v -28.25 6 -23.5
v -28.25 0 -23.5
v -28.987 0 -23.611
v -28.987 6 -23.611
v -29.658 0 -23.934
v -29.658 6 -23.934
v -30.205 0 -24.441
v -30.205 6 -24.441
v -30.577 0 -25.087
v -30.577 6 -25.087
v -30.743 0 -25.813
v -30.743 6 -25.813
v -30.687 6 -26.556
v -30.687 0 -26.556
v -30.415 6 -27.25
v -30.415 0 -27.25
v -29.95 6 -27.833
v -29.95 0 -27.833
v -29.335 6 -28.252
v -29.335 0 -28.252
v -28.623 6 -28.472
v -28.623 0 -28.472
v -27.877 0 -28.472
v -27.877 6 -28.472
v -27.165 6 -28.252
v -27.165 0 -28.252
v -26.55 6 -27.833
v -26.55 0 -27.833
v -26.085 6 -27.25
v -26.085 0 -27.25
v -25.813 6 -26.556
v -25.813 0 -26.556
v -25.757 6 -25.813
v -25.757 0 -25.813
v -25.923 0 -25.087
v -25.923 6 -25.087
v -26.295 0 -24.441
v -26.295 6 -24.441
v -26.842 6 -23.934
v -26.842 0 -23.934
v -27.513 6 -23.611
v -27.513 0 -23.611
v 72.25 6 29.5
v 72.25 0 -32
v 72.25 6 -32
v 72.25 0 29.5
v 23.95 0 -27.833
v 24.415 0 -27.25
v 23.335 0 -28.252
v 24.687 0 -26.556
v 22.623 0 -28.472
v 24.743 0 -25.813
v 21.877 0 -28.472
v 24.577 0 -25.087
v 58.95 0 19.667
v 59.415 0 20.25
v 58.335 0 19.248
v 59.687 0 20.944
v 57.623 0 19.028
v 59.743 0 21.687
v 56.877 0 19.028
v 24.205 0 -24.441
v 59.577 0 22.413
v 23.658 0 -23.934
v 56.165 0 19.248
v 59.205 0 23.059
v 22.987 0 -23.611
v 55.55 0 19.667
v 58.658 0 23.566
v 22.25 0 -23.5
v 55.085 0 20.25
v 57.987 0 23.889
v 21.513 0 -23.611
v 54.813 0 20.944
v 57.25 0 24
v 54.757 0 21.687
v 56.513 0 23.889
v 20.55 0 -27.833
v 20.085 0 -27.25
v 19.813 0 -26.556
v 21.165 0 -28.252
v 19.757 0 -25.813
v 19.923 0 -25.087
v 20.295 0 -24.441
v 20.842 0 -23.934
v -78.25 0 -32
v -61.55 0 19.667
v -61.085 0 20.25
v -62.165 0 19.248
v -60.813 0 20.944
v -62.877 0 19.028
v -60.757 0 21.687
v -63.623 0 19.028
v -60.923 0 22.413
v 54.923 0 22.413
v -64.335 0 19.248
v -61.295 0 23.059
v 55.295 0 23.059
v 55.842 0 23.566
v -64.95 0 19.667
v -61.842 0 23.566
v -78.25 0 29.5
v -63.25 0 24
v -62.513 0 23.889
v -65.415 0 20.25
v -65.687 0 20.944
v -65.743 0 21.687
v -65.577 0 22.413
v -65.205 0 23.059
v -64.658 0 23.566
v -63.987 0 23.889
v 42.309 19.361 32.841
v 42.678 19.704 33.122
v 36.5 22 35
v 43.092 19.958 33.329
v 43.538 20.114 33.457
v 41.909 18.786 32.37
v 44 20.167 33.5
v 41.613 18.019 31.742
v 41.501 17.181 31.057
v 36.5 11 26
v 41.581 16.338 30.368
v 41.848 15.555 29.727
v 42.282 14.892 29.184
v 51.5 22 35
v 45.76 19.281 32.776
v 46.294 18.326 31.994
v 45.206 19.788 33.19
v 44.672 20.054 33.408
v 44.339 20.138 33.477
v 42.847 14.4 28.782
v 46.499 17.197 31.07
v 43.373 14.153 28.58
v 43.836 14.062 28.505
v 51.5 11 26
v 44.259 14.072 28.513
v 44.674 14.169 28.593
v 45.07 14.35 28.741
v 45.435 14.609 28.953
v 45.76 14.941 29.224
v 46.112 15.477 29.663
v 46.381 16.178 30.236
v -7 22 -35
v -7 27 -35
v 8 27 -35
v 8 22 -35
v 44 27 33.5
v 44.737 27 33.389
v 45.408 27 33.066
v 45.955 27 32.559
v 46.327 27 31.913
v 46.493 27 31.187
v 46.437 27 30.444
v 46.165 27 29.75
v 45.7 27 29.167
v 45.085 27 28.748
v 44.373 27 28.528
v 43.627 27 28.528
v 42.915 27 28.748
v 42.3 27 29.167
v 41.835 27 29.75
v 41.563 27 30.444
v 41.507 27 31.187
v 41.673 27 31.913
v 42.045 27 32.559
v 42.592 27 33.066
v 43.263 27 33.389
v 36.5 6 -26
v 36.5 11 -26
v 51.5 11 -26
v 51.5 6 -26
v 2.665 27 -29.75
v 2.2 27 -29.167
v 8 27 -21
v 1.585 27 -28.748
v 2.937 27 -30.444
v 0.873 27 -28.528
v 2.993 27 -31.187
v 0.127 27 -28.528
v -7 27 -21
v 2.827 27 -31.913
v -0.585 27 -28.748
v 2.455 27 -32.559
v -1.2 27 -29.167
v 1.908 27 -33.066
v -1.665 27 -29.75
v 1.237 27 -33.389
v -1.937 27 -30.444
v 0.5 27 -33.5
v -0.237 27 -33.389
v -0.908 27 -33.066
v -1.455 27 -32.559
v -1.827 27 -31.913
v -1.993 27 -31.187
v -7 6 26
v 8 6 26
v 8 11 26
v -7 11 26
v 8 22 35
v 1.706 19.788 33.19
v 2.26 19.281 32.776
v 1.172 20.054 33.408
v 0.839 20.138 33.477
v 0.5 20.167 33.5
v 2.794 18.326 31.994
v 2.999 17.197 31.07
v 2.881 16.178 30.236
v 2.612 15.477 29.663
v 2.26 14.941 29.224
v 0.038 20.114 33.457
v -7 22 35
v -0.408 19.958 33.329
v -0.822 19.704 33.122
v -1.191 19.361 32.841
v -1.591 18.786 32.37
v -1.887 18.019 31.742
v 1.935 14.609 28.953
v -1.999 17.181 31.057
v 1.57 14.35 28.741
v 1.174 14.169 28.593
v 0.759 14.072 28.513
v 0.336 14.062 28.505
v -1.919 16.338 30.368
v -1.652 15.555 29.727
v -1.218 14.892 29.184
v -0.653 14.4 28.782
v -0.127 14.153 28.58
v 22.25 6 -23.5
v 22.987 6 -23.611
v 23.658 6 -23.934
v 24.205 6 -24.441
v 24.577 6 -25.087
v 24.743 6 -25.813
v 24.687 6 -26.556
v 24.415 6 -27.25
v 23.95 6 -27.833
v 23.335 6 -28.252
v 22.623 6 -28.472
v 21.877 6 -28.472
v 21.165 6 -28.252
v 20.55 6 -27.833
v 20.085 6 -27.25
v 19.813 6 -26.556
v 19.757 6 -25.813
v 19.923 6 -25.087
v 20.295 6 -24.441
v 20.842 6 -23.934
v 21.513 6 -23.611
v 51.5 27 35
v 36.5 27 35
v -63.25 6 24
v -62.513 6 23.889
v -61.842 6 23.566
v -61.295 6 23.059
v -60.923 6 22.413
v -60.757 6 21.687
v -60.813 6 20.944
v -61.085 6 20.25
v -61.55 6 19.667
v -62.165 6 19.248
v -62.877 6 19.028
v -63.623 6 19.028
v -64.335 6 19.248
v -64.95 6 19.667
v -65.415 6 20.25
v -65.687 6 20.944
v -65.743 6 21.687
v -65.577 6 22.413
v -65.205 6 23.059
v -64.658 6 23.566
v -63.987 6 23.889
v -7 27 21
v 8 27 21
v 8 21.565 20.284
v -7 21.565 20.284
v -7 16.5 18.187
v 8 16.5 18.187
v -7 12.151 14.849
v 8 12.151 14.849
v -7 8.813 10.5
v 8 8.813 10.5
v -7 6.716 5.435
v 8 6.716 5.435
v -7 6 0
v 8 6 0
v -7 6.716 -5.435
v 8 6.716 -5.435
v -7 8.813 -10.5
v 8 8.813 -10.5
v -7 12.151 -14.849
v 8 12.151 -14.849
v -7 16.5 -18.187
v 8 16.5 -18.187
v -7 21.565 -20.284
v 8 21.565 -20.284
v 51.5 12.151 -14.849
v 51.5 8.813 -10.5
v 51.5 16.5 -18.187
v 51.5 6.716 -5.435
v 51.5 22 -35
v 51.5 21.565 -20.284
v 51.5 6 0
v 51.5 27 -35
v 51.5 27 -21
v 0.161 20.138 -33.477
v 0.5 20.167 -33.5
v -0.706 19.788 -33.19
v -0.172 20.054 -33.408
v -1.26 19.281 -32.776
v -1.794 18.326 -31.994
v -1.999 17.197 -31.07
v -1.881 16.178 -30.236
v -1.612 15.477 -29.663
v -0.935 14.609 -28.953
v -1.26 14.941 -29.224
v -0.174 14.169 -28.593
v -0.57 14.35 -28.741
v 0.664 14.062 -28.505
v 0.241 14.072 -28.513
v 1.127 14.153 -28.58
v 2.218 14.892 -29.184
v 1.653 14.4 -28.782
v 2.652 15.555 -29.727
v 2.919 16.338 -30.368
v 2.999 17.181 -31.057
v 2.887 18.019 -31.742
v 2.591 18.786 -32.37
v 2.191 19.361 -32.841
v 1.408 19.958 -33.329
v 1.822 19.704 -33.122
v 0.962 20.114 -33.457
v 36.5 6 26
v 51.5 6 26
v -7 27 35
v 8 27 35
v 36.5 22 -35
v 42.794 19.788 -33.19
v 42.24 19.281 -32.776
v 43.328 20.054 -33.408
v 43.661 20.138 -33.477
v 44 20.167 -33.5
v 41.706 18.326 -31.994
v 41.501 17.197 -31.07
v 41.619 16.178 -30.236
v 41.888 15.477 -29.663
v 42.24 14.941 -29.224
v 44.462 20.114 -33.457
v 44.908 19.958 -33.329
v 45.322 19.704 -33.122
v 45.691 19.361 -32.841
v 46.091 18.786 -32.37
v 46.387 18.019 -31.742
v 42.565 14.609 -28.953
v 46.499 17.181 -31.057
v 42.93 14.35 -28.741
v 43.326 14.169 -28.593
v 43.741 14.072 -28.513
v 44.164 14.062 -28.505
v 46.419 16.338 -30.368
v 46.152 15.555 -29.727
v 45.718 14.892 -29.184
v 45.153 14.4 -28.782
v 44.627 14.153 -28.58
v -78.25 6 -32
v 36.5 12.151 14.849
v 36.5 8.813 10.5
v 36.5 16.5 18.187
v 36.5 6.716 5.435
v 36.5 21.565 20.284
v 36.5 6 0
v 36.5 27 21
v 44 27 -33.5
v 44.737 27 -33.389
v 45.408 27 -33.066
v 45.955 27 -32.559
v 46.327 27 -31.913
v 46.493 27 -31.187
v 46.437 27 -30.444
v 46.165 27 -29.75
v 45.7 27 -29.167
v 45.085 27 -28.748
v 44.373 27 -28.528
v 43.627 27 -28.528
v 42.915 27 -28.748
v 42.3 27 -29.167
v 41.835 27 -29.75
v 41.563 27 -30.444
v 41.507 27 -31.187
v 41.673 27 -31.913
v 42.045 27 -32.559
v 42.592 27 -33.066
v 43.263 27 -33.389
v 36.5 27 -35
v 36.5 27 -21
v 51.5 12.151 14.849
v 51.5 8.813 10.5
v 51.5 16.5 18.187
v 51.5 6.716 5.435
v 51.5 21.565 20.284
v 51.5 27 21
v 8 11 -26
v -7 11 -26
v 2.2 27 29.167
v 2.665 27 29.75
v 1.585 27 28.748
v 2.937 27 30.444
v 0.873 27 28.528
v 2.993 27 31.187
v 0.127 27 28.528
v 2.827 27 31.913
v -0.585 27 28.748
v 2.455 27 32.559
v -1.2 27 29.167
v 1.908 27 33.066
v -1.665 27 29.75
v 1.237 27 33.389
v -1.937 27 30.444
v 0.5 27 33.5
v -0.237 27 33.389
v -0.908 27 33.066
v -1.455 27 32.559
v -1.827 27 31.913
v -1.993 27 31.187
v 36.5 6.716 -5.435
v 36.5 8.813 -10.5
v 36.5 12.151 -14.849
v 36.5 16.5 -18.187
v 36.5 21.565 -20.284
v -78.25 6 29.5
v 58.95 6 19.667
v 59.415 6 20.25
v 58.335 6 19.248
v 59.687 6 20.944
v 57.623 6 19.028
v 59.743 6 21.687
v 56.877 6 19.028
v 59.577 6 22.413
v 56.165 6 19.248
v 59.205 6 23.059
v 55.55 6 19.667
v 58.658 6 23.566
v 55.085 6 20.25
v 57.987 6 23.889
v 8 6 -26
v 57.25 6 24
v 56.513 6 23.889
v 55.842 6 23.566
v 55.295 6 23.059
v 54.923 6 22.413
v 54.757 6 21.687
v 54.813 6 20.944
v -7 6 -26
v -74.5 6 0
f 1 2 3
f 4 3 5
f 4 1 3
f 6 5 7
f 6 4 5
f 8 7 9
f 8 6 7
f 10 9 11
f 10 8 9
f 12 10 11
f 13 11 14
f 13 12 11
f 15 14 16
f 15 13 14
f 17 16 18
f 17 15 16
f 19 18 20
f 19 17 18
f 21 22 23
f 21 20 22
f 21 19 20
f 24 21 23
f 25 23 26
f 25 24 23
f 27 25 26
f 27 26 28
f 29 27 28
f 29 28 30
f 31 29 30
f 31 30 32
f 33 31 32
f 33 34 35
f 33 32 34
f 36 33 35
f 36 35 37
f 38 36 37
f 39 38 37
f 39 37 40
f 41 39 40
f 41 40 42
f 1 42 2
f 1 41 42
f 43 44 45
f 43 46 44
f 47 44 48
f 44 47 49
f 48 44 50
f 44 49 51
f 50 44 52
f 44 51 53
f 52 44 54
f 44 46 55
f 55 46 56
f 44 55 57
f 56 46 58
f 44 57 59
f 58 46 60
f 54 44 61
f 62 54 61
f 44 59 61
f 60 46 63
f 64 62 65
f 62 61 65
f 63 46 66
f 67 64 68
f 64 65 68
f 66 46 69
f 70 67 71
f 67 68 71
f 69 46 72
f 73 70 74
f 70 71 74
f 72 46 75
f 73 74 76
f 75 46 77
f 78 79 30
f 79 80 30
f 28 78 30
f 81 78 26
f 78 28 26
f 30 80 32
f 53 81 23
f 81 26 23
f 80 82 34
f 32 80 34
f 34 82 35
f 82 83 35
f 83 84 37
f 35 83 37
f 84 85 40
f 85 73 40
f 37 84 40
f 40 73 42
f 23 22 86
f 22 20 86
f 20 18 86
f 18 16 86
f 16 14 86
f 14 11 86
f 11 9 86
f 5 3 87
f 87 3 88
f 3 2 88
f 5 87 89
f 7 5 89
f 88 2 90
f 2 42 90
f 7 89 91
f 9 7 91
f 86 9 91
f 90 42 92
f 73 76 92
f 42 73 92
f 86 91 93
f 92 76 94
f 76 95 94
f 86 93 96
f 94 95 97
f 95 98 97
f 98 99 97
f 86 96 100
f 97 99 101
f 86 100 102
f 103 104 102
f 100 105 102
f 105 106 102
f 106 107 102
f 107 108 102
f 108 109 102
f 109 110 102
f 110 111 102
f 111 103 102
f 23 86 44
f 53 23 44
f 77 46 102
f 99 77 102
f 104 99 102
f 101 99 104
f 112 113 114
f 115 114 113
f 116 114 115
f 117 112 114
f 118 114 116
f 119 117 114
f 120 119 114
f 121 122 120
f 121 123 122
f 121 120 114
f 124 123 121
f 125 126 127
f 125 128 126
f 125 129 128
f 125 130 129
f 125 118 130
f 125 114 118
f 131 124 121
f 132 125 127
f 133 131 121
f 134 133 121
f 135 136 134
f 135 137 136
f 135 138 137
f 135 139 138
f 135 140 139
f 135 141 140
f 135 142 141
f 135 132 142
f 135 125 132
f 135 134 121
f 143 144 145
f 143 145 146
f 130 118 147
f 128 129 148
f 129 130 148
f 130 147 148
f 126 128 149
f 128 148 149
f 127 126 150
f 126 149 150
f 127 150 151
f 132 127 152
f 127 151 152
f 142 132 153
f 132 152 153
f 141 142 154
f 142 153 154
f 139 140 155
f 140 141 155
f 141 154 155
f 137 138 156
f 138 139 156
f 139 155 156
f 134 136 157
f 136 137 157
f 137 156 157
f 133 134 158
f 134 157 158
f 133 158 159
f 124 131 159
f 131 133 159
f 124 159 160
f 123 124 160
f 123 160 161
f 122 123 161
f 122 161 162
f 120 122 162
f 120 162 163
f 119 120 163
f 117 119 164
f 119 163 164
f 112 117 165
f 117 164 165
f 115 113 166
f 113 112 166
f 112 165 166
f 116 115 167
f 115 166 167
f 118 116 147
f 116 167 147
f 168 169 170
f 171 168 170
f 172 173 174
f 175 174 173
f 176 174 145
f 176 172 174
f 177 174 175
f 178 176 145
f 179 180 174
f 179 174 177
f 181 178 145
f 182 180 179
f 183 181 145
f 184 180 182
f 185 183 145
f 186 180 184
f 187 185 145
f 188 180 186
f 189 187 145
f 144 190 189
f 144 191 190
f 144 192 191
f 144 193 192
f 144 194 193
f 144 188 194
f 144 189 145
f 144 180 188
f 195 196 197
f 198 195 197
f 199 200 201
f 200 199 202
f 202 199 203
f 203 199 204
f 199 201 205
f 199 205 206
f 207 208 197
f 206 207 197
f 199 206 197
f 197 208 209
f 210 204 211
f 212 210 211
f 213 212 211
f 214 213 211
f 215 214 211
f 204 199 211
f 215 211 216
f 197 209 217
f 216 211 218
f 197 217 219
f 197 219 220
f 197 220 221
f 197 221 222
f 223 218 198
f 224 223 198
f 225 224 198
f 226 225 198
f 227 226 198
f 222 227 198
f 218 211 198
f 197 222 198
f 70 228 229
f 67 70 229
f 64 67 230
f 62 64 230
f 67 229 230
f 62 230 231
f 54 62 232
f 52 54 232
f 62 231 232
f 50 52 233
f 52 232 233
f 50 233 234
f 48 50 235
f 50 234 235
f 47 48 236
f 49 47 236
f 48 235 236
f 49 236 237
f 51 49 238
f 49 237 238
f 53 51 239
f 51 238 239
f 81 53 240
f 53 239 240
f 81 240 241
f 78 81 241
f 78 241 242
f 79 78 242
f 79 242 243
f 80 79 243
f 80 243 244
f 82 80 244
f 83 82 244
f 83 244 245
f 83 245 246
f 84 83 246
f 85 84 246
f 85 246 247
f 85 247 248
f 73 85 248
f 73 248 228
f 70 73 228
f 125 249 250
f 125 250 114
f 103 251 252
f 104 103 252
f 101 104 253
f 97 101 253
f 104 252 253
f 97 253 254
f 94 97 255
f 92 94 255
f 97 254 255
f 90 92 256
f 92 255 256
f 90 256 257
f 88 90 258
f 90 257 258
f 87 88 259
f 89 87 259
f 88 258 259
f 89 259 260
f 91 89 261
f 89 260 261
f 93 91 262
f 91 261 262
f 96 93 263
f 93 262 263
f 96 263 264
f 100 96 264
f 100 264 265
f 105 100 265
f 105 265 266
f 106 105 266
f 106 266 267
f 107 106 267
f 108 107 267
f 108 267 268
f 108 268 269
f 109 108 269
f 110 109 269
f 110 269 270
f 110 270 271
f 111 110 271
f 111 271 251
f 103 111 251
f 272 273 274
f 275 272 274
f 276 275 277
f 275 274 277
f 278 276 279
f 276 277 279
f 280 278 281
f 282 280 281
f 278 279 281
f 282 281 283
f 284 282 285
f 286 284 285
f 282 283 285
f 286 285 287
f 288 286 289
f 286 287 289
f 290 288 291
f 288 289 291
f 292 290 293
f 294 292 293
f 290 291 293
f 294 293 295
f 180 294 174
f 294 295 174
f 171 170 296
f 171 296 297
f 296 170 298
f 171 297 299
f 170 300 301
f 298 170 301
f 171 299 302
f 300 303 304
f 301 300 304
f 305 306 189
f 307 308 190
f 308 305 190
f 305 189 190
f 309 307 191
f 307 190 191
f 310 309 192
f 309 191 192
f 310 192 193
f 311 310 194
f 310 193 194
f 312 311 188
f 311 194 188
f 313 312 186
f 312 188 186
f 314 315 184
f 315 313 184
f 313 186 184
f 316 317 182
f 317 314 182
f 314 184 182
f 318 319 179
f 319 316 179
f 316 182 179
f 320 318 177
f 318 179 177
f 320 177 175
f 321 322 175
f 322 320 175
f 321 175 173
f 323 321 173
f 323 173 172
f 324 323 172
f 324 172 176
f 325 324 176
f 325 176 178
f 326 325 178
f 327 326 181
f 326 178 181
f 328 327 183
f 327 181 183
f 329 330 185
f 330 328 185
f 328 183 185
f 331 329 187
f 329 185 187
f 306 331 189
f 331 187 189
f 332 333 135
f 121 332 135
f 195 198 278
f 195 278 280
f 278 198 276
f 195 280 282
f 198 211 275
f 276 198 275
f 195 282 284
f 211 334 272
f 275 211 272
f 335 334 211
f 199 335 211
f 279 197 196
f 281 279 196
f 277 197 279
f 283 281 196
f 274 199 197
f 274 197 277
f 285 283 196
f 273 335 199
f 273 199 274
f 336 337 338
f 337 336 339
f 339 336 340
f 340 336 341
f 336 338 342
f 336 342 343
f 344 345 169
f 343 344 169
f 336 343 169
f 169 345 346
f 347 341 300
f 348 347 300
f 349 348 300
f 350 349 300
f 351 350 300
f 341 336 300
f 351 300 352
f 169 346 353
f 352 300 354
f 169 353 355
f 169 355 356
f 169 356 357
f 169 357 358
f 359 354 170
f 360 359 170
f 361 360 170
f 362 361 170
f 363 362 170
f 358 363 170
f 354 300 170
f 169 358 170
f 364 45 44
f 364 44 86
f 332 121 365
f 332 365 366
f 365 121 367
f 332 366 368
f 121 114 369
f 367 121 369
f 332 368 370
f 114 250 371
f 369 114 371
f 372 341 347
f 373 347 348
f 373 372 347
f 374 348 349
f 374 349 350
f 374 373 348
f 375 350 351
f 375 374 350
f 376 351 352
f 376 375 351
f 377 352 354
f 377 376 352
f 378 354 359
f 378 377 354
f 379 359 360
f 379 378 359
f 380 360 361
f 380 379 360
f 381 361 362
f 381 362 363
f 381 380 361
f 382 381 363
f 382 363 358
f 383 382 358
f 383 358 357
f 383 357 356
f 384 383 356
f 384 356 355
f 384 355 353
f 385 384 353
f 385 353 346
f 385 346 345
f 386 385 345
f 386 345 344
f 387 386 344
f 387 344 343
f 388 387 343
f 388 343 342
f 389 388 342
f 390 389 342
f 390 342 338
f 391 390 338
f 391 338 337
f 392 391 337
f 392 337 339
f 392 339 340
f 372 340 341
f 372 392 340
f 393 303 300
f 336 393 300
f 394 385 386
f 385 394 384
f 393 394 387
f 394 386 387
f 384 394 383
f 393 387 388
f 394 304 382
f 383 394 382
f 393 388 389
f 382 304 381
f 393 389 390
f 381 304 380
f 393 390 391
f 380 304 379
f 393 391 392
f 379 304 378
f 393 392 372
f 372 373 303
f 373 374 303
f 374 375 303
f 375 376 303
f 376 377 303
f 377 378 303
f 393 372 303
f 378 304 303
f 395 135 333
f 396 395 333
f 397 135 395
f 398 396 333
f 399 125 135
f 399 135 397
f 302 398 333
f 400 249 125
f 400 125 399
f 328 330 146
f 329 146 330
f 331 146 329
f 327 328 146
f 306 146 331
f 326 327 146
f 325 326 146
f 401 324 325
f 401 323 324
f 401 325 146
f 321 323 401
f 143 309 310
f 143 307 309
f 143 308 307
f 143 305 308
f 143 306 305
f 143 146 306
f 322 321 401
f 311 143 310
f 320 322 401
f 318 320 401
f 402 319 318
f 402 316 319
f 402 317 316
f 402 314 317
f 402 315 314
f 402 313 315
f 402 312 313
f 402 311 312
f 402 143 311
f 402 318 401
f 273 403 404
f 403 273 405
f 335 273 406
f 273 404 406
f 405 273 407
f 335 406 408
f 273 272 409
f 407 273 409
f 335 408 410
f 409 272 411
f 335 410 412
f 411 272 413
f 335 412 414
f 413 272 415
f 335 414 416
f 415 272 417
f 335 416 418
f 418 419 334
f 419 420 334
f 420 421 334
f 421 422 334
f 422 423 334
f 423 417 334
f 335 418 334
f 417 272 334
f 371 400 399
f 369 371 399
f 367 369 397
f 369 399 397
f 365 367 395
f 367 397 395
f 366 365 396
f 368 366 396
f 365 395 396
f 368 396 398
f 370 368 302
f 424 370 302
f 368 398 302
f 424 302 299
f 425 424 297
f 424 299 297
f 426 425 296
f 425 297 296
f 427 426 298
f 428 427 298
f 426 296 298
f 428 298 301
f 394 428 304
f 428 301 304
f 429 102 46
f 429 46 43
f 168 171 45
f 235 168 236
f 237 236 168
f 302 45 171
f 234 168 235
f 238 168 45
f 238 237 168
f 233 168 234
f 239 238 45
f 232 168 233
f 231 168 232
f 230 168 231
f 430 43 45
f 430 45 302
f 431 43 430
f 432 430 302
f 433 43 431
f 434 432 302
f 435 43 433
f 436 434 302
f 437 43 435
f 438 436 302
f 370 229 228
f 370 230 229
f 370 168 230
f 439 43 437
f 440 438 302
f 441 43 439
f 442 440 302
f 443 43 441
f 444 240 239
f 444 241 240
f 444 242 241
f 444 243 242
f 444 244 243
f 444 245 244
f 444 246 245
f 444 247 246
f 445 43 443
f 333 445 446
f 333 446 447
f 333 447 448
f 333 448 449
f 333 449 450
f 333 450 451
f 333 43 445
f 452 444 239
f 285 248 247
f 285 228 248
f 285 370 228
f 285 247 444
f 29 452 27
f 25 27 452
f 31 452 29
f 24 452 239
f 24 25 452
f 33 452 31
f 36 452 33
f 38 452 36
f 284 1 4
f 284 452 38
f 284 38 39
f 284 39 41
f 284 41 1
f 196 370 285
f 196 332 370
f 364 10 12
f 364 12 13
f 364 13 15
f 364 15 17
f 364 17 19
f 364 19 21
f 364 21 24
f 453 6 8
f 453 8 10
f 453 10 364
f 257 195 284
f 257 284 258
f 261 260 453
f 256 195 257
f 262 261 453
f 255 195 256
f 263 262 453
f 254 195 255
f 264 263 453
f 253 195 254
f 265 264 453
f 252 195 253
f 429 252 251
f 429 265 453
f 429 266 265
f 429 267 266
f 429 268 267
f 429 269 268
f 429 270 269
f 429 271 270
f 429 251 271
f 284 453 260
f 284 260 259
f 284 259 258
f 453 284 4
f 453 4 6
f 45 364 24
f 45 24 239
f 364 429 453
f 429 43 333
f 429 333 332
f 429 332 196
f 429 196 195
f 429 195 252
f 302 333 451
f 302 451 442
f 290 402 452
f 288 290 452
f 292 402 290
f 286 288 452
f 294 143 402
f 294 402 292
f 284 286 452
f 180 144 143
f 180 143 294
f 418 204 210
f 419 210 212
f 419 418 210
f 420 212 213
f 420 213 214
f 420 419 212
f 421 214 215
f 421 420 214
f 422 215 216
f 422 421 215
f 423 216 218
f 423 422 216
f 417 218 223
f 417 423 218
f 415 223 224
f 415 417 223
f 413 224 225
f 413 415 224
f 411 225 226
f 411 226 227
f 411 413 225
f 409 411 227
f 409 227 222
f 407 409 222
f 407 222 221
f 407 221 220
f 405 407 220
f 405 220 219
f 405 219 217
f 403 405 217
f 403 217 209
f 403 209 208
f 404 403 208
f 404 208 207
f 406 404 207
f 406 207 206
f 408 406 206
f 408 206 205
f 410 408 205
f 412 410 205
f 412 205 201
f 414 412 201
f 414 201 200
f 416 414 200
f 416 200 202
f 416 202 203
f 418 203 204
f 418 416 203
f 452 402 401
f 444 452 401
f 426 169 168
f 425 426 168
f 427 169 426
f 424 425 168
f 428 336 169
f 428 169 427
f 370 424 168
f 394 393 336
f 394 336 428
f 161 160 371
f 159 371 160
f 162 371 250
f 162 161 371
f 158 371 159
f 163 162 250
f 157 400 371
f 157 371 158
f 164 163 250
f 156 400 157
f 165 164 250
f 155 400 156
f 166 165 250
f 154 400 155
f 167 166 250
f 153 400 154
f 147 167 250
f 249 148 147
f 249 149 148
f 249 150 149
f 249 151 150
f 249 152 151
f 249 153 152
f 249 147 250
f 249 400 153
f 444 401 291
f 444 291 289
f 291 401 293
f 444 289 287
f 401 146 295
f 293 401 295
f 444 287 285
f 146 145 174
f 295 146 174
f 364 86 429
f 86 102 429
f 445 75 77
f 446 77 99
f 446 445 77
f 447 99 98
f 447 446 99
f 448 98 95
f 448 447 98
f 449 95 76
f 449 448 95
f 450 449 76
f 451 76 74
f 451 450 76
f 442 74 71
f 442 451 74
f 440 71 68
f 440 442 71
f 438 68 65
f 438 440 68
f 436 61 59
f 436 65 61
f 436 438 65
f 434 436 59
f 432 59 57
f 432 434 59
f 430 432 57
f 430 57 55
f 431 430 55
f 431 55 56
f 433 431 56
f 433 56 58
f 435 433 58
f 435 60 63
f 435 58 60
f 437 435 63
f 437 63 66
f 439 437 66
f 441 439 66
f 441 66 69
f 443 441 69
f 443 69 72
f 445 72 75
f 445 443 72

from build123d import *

# Parameters (mm, degrees)
CROQUIS1_W                = 149
CROQUIS1_H                = 53
SALIENTE_EXTRUIR1_DEPTH   = 6
SALIENTE_EXTRUIR2_DEPTH   = 15
SALIENTE_EXTRUIR5_DEPTH   = 15
CROQUIS3_R                = 21
CORTAR_EXTRUIR2_DEPTH     = 140.238105417
CROQUIS10_W               = 149
CROQUIS10_H               = 6
SALIENTE_EXTRUIR23_DEPTH  = 3
CROQUIS11_W               = 2.25
CROQUIS11_H               = 56
CORTAR_EXTRUIR3_DEPTH     = 93.895102131
CROQUIS12_W               = 56
CROQUIS12_H               = 6
SALIENTE_EXTRUIR24_DEPTH  = 3.75
CROQUIS13_W               = 150.5
CROQUIS13_H               = 0.5
CORTAR_EXTRUIR4_DEPTH     = 96.928684448
CROQUIS14_W               = 169.427236994
CROQUIS14_H               = 76.033419256
CORTAR_EXTRUIR5_DEPTH     = 88.876689173
SALIENTE_EXTRUIR25_DEPTH  = 15
CROQUIS16_R               = 2.5
CORTAR_EXTRUIR6_DEPTH     = 15
SIMETR_A2_COPY_1_DEPTH    = 15
SIMETR_A2_COPY_2_SKETCH_R = 2.5
SIMETR_A2_COPY_2_DEPTH    = 15
CROQUIS17_R               = 2.5
CORTAR_EXTRUIR7_DEPTH     = 89.255665541
CROQUIS19_W               = 150.5
CROQUIS19_H               = 6
SALIENTE_EXTRUIR26_DEPTH  = 6
CROQUIS20_R               = 2.5
CORTAR_EXTRUIR8_DEPTH     = 89.255665541


with BuildPart() as part:
    # Croquis1 → Saliente-Extruir1 (new body)
    with BuildSketch(Plane(origin=(0, 0, 0), x_dir=(1, 0, 0), z_dir=(0, 1, 0))):
        Rectangle(CROQUIS1_W, CROQUIS1_H)
    extrude(amount=SALIENTE_EXTRUIR1_DEPTH)

    # Croquis2 → Saliente-Extruir2 (add)
    with BuildSketch(Plane(origin=(51.5, 0, 0), x_dir=(0, 0, -1), z_dir=(1, 0, 0))):
        with BuildLine():
            Line((26, 6), (-26, 6))
            Line((-26, 6), (-26, 27))
            ThreePointArc((-26, 27), (0, 53), (26, 27))
            Line((26, 27), (26, 6))
        make_face()
    extrude(amount=-SALIENTE_EXTRUIR2_DEPTH)

    # Croquis5 → Saliente-Extruir5 (add)
    with BuildSketch(Plane.ZY.offset(-8)):
        with BuildLine():
            Line((-26, 6), (26, 6))
            Line((26, 6), (26, 27))
            ThreePointArc((26, 27), (0, 53), (-26, 27))
            Line((-26, 27), (-26, 6))
        make_face()
    extrude(amount=SALIENTE_EXTRUIR5_DEPTH)

    # Croquis3 → Cortar-Extruir2 (cut, through all)
    with BuildSketch(Plane(origin=(51.5, 0, 0), x_dir=(0, 0, -1), z_dir=(1, 0, 0))):
        with Locations(Location((0, 27, 0), (0, 0, 270))):
            Circle(CROQUIS3_R)
    extrude(amount=-CORTAR_EXTRUIR2_DEPTH, mode=Mode.SUBTRACT)

    # Croquis10 → Saliente-Extruir23 (add)
    with BuildSketch(Plane.XY.offset(26.5)):
        with Locations((0, 3)):
            Rectangle(CROQUIS10_W, CROQUIS10_H)
    extrude(amount=SALIENTE_EXTRUIR23_DEPTH)

    # Croquis11 → Cortar-Extruir3 (cut, through all)
    with BuildSketch(Plane(origin=(0, 6, 0), x_dir=(1, 0, 0), z_dir=(0, 1, 0))):
        with Locations((73.375, -1.5)):
            Rectangle(CROQUIS11_W, CROQUIS11_H)
    extrude(amount=-CORTAR_EXTRUIR3_DEPTH, mode=Mode.SUBTRACT)

    # Croquis12 → Saliente-Extruir24 (add)
    with BuildSketch(Plane.ZY.offset(74.5)):
        with Locations((1.5, 3)):
            Rectangle(CROQUIS12_W, CROQUIS12_H)
    extrude(amount=SALIENTE_EXTRUIR24_DEPTH)

    # Croquis13 → Cortar-Extruir4 (cut, through all)
    with BuildSketch(Plane(origin=(0, 6, 0), x_dir=(1, 0, 0), z_dir=(0, 1, 0))):
        with Locations((-3, 26.25)):
            Rectangle(CROQUIS13_W, CROQUIS13_H)
    extrude(amount=-CORTAR_EXTRUIR4_DEPTH, mode=Mode.SUBTRACT)

    # Croquis14 → Cortar-Extruir5 (cut, through all)
    with BuildSketch(Plane(origin=(0, 27, 0), x_dir=(-1, 0, 0), z_dir=(0, -1, 0))):
        Rectangle(CROQUIS14_W, CROQUIS14_H)
    extrude(amount=-CORTAR_EXTRUIR5_DEPTH, mode=Mode.SUBTRACT)

    # Croquis15 → Saliente-Extruir25 (add)
    with BuildSketch(Plane(origin=(51.5, 0, 0), x_dir=(0, 0, -1), z_dir=(1, 0, 0))):
        Polygon((-26, 27), (-35, 27), (-35, 22), (-26, 11), align=None)
    saliente_extruir25 = extrude(amount=-SALIENTE_EXTRUIR25_DEPTH)

    # Croquis16 → Cortar-Extruir6 (cut)
    with BuildSketch(Plane(origin=(0, 27, 0), x_dir=(1, 0, 0), z_dir=(0, 1, 0))):
        with Locations(Location((44, -31, 0), (0, 0, 270))):
            Circle(CROQUIS16_R)
    cortar_extruir6 = extrude(amount=-CORTAR_EXTRUIR6_DEPTH, mode=Mode.SUBTRACT)

    # Simetría1: Saliente-Extruir25, Cortar-Extruir6 across plane
    add(saliente_extruir25.mirror(Plane.ZY.offset(-22.25)))
    add(cortar_extruir6.mirror(Plane.ZY.offset(-22.25)), mode=Mode.SUBTRACT)

    # Simetría2: Saliente-Extruir25, Cortar-Extruir6 across plane
    add(saliente_extruir25.mirror(Plane.XY))
    add(cortar_extruir6.mirror(Plane.XY), mode=Mode.SUBTRACT)

    # Simetría2 copy 1 sketch → Simetría2 copy 1 (add)
    with BuildSketch(Plane.ZY.offset(7)):
        Polygon((-26, 27), (-35, 27), (-35, 22), (-26, 11), align=None)
    extrude(amount=-SIMETR_A2_COPY_1_DEPTH)

    # Simetría2 copy 2 sketch → Simetría2 copy 2 (cut)
    with BuildSketch(Plane(origin=(44.5, 27, 0), x_dir=(-1, 0, 0), z_dir=(0, 1, 0))):
        with Locations(Location((44, -31, 0), (0, 0, 270))):
            Circle(SIMETR_A2_COPY_2_SKETCH_R)
    extrude(amount=-SIMETR_A2_COPY_2_DEPTH, mode=Mode.SUBTRACT)

    # Croquis17 → Cortar-Extruir7 (cut, through all)
    with BuildSketch(Plane(origin=(0, 6, 0), x_dir=(1, 0, 0), z_dir=(0, 1, 0))):
        with Locations(Location((-63.25, -21.5, 0), (0, 0, 270))):
            Circle(CROQUIS17_R)
    cortar_extruir7 = extrude(amount=-CORTAR_EXTRUIR7_DEPTH, mode=Mode.SUBTRACT)

    # Croquis19 → Saliente-Extruir26 (add)
    with BuildSketch(Plane(origin=(0, 0, -26), x_dir=(-1, 0, 0), z_dir=(0, 0, -1))):
        with Locations((3, 3)):
            Rectangle(CROQUIS19_W, CROQUIS19_H)
    extrude(amount=SALIENTE_EXTRUIR26_DEPTH)

    # Simetría5: Cortar-Extruir7 across plane
    add(cortar_extruir7.mirror(Plane(origin=(-3, 0, 0), x_dir=(0, 0, 1), z_dir=(1, 0, 0))), mode=Mode.SUBTRACT)

    # Croquis20 → Cortar-Extruir8 (cut, through all)
    with BuildSketch(Plane(origin=(0, 6, 0), x_dir=(1, 0, 0), z_dir=(0, 1, 0))):
        with Locations(Location((22.25, 26, 0), (0, 0, 270))):
            Circle(CROQUIS20_R)
    cortar_extruir8 = extrude(amount=-CORTAR_EXTRUIR8_DEPTH, mode=Mode.SUBTRACT)

    # Simetría6: Cortar-Extruir8 across plane
    add(cortar_extruir8.mirror(Plane(origin=(-3, 0, 0), x_dir=(0, 0, 1), z_dir=(1, 0, 0))), mode=Mode.SUBTRACT)


solid = part.part
